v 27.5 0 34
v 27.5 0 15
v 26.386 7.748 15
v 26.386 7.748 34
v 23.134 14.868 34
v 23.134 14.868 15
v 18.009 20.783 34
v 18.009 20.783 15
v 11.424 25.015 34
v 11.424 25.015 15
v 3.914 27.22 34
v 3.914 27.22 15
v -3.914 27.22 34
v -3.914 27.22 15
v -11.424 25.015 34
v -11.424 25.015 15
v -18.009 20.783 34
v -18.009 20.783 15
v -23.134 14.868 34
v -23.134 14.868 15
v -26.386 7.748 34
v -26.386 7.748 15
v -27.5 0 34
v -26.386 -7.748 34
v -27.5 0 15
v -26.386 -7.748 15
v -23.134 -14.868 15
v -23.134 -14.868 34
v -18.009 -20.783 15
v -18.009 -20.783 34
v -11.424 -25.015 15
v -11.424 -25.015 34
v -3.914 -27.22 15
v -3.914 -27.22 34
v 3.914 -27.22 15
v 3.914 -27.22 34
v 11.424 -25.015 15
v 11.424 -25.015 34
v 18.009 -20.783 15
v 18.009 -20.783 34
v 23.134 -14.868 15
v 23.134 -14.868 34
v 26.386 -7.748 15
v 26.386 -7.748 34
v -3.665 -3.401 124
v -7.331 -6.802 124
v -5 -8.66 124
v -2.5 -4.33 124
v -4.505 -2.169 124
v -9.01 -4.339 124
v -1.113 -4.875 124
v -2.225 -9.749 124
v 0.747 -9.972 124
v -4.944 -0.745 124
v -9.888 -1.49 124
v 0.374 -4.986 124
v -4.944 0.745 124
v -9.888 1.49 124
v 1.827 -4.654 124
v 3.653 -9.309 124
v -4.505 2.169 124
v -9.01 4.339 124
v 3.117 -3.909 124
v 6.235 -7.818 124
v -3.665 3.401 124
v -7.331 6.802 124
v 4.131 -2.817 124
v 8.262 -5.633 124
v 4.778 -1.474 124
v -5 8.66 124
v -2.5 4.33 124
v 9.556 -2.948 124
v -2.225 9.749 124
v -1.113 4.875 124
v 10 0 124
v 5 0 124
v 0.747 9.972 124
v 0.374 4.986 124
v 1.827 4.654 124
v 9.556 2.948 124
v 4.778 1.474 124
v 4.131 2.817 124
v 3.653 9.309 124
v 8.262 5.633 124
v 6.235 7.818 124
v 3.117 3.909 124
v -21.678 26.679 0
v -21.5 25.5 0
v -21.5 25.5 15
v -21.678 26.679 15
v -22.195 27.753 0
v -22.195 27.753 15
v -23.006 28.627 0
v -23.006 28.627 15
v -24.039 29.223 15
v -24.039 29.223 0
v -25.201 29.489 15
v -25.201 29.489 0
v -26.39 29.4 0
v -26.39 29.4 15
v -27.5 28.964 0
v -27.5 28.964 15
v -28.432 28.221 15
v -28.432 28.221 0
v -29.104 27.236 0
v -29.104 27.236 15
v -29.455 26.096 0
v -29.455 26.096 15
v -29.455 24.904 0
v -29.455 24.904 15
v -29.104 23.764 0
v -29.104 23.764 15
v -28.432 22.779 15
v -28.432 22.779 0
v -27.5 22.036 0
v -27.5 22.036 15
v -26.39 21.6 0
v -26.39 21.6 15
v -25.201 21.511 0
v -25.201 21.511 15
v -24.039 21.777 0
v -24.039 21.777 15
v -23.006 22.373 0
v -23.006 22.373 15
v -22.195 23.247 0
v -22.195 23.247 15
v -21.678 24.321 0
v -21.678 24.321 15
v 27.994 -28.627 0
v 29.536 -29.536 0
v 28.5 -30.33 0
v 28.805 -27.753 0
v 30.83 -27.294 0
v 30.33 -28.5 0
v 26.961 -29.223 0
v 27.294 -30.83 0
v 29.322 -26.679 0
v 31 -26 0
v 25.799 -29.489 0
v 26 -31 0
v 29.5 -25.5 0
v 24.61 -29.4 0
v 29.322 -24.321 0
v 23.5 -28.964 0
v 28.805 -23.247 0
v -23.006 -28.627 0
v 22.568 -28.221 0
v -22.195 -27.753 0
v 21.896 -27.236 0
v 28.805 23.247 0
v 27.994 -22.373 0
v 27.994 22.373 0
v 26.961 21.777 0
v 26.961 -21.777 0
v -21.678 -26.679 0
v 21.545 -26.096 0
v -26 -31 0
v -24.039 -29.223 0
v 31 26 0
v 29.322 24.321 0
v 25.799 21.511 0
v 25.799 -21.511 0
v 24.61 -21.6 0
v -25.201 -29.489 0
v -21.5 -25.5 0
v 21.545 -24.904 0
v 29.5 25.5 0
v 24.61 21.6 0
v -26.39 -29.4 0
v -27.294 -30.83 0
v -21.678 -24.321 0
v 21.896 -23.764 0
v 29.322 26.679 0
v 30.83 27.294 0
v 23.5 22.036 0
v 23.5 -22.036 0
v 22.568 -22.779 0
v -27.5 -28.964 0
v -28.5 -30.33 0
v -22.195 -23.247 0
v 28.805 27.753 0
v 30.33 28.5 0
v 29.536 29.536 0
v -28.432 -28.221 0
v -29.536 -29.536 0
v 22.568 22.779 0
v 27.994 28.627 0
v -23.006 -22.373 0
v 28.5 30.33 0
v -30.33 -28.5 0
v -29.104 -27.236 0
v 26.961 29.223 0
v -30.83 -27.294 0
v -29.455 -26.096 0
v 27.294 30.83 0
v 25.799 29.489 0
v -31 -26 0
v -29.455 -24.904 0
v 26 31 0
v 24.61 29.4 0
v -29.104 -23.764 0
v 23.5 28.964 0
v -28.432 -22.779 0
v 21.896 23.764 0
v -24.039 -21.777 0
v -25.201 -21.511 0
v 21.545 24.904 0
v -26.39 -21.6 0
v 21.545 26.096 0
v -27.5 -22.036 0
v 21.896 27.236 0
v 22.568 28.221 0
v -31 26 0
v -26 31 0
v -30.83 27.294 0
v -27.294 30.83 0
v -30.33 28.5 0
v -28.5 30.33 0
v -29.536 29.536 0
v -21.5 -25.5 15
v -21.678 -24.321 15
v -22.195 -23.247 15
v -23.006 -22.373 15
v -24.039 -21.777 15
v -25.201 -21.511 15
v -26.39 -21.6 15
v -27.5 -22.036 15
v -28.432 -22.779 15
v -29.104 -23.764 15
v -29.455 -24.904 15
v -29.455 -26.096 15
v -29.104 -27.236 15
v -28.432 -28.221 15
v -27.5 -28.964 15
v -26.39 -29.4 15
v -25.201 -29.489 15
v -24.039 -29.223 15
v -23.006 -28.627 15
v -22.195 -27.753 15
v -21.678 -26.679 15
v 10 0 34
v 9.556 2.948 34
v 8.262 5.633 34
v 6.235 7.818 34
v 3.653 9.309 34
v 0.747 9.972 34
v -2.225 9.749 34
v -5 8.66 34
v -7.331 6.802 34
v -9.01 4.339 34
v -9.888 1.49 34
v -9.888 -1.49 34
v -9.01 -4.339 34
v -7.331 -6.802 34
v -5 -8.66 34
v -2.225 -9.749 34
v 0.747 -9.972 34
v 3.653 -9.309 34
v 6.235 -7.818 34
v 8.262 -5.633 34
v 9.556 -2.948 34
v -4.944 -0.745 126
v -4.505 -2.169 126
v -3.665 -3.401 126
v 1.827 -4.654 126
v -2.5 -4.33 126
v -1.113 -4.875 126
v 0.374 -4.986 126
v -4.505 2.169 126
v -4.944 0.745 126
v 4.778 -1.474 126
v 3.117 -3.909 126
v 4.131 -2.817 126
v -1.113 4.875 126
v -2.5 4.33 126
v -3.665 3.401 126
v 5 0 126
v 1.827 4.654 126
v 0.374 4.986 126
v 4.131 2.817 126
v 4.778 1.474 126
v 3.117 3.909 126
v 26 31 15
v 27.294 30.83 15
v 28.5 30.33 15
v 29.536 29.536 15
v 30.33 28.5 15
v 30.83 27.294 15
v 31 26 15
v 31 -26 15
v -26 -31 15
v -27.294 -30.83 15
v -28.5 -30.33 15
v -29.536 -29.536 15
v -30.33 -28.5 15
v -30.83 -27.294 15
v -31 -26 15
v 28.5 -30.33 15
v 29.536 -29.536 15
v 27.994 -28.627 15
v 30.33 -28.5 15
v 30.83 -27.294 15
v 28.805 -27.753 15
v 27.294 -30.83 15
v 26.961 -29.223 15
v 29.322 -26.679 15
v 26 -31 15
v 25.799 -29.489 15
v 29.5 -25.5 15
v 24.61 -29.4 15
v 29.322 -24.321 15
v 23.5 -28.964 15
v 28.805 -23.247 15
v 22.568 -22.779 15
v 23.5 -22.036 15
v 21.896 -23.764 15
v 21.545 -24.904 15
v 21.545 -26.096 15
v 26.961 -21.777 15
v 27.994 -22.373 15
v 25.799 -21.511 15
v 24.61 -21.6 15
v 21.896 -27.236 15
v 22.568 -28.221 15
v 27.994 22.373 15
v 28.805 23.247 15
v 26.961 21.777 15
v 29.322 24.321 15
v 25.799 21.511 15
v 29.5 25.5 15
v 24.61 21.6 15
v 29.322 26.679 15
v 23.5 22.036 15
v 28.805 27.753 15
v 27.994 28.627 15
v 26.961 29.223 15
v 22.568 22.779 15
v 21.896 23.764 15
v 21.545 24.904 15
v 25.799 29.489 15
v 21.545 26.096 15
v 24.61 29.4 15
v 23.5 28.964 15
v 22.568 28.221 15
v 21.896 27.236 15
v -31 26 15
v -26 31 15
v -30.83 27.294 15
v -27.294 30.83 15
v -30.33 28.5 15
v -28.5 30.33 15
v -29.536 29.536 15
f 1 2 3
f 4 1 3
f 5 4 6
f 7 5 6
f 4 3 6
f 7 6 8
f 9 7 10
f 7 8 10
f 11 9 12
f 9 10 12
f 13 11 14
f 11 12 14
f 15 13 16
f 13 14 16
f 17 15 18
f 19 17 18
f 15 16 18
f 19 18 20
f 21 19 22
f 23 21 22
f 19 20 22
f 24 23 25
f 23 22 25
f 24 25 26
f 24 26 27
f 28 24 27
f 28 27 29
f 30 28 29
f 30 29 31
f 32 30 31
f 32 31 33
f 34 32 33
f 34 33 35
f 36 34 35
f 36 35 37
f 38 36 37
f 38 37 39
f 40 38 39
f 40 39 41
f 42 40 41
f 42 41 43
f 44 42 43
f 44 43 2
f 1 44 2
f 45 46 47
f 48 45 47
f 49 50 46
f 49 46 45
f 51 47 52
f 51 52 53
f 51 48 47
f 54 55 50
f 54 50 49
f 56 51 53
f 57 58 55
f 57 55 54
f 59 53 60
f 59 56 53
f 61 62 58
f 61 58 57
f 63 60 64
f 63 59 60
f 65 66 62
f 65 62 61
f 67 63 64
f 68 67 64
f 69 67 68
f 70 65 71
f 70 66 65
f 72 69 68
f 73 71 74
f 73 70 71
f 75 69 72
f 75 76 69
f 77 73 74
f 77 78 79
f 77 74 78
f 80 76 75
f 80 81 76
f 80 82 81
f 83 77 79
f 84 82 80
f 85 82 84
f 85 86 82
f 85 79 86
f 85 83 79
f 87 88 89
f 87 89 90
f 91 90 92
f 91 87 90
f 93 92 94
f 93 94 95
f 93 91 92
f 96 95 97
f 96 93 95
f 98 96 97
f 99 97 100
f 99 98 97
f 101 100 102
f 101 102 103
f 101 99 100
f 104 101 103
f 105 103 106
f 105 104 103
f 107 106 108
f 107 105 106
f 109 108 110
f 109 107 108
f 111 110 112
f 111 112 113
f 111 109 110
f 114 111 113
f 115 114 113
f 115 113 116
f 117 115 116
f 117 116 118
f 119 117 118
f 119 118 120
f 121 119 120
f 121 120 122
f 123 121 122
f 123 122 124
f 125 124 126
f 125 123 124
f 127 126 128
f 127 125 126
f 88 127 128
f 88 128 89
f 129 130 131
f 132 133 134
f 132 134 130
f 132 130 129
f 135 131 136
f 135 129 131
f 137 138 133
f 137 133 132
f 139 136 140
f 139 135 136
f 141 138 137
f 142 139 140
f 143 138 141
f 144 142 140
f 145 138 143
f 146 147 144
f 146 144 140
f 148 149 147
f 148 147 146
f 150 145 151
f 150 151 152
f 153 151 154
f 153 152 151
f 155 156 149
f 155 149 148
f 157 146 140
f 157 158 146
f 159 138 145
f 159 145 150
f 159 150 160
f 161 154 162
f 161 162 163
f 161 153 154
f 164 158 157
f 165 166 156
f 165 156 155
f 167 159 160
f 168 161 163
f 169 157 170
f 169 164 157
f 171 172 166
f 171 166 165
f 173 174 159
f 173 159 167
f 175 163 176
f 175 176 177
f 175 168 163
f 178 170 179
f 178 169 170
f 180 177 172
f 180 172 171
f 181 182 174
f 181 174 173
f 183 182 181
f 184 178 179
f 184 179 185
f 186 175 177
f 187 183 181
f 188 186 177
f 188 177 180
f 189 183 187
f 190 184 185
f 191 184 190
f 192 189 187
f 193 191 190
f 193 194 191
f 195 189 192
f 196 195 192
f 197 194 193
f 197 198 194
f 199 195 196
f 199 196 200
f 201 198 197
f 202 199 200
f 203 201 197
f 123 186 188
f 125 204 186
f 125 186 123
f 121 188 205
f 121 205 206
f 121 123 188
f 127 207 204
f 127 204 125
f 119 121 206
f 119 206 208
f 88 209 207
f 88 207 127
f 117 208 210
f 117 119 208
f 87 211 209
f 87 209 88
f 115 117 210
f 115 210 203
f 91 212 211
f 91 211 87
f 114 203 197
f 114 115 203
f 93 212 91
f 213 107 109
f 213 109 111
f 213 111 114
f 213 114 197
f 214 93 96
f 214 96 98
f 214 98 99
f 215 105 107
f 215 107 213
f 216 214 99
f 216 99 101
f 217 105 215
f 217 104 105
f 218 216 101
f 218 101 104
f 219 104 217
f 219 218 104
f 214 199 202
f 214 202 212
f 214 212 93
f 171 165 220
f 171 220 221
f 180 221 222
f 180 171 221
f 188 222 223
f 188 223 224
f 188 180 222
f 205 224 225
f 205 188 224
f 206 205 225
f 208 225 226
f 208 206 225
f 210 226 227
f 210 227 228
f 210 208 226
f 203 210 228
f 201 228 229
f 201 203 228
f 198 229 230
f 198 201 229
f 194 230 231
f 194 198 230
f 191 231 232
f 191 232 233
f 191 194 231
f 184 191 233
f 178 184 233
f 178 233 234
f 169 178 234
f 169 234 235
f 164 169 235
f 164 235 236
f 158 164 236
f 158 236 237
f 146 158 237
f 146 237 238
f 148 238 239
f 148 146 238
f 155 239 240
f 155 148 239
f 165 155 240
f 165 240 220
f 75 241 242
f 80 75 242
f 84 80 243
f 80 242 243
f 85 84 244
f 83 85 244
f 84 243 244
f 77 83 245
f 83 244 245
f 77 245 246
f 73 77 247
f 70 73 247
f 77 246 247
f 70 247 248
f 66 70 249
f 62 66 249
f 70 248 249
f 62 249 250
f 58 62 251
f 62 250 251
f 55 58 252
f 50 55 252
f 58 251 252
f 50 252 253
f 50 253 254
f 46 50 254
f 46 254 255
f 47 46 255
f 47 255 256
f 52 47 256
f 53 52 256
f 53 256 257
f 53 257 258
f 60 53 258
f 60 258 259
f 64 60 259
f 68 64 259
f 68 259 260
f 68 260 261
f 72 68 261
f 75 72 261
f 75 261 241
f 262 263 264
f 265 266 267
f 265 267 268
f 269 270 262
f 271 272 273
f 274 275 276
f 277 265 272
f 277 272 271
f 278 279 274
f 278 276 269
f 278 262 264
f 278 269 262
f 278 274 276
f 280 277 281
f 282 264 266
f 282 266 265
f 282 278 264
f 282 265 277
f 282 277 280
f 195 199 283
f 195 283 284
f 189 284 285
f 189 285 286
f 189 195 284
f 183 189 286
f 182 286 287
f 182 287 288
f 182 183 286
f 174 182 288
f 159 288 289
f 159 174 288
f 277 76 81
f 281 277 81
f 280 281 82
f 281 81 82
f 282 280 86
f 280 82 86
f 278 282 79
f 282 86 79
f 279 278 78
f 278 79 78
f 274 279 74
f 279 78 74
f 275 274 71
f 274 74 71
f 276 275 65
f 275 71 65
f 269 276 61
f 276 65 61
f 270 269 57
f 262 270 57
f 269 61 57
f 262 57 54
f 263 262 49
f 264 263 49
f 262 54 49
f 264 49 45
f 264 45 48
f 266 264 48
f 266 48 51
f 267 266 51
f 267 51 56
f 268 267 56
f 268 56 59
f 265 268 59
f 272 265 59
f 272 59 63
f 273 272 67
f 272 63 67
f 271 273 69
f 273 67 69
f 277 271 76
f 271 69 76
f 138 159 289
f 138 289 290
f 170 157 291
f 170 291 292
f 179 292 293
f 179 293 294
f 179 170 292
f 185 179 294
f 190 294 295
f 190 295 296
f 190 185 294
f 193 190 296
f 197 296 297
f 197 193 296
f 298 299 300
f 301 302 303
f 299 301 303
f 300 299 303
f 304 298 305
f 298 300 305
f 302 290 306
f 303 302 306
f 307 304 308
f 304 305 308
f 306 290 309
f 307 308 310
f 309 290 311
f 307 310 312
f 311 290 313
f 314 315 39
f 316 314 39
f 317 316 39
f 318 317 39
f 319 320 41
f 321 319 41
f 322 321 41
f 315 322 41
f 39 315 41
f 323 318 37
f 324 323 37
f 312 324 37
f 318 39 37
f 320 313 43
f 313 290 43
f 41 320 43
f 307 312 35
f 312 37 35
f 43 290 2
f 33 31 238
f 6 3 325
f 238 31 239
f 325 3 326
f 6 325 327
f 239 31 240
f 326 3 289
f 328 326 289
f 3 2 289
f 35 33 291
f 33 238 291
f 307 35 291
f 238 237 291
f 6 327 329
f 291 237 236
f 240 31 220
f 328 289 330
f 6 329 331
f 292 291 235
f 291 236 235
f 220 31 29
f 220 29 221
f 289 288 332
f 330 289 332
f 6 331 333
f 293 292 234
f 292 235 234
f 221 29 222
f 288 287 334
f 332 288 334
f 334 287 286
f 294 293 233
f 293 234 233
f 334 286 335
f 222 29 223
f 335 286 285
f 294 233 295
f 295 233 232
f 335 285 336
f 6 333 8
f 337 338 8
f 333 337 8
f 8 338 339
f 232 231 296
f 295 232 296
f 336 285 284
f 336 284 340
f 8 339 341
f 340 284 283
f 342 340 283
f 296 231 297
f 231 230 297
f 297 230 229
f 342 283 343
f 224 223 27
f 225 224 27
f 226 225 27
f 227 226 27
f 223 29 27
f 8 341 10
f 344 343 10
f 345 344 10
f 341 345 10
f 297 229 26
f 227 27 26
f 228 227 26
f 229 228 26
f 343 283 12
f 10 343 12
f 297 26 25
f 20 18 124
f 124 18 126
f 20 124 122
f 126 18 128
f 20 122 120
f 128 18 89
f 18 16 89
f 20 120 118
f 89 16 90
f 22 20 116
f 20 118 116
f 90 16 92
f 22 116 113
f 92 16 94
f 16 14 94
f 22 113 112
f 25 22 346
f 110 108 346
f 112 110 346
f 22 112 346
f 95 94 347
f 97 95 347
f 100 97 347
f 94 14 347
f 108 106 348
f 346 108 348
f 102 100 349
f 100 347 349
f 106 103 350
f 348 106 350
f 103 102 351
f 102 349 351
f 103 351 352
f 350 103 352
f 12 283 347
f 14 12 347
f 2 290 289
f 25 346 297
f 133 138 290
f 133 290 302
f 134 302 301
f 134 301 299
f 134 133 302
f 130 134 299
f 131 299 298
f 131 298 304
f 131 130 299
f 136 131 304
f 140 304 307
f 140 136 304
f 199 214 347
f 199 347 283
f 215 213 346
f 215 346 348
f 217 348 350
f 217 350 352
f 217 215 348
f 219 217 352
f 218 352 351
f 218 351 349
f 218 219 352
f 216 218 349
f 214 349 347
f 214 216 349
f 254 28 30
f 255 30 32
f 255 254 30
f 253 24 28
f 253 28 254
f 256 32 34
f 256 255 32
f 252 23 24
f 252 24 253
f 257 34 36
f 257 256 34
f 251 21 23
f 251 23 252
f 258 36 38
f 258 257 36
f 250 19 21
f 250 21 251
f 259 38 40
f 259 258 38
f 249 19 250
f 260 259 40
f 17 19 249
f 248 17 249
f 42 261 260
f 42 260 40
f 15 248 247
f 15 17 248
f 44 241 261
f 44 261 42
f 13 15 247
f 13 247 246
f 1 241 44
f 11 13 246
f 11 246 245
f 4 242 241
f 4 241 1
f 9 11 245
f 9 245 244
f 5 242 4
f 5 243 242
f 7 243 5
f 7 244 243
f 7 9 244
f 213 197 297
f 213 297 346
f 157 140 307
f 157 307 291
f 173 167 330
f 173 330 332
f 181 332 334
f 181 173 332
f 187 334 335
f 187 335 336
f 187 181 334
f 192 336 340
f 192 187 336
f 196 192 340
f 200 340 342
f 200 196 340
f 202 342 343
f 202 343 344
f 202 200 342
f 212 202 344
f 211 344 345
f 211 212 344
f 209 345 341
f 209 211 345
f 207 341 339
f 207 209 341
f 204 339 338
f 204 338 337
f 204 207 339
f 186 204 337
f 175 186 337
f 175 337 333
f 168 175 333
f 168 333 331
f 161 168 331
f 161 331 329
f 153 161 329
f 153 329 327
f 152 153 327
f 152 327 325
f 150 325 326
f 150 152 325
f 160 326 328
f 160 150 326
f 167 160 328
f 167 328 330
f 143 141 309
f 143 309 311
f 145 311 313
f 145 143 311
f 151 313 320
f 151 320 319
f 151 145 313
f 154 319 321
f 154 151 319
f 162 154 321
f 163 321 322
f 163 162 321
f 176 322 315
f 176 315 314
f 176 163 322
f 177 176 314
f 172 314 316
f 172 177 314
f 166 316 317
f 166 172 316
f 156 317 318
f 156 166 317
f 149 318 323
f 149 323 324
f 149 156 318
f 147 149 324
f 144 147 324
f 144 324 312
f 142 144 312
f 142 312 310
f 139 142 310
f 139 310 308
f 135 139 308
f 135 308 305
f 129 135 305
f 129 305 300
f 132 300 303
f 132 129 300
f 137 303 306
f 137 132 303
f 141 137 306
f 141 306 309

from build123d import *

# Parameters (mm, degrees)
SKETCH1_R           = 27.5
SKETCH1_R_2         = 4
BOSS_EXTRUDE1_DEPTH = 15
SKETCH1_3_R         = 27.5
SKETCH1_3_R_2       = 10
BOSS_EXTRUDE2_DEPTH = 34
SKETCH1_4_R         = 10
BOSS_EXTRUDE3_DEPTH = 124
BOSS_EXTRUDE4_START = 124
SKETCH1_5_R         = 5
BOSS_EXTRUDE4_DEPTH = 2


with BuildPart() as part:
    # Sketch1 → Boss-Extrude1 (new body)
    with BuildSketch(Plane.XY):
        with BuildLine():
            Line((-26, 31), (26, 31))
            ThreePointArc((26, 31), (29.535533906, 29.535533906), (31, 26))
            Line((31, 26), (31, -26))
            ThreePointArc((31, -26), (29.535533906, -29.535533906), (26, -31))
            Line((26, -31), (-26, -31))
            ThreePointArc((-26, -31), (-29.535533906, -29.535533906), (-31, -26))
            Line((-31, -26), (-31, 26))
            ThreePointArc((-31, 26), (-29.535533906, 29.535533906), (-26, 31))
        make_face()
        Circle(SKETCH1_R, mode=Mode.SUBTRACT)
        with Locations((-25.5, 25.5)):
            Circle(SKETCH1_R_2, mode=Mode.SUBTRACT)
        with Locations((25.5, 25.5)):
            Circle(SKETCH1_R_2, mode=Mode.SUBTRACT)
        with Locations((-25.5, -25.5)):
            Circle(SKETCH1_R_2, mode=Mode.SUBTRACT)
        with Locations((25.5, -25.5)):
            Circle(SKETCH1_R_2, mode=Mode.SUBTRACT)
    extrude(amount=BOSS_EXTRUDE1_DEPTH)

    # Sketch1<3> → Boss-Extrude2 (add)
    with BuildSketch(Plane.XY):
        Circle(SKETCH1_3_R)
        Circle(SKETCH1_3_R_2, mode=Mode.SUBTRACT)
    extrude(amount=BOSS_EXTRUDE2_DEPTH)

    # Sketch1<4> → Boss-Extrude3 (add)
    with BuildSketch(Plane.XY):
        Circle(SKETCH1_4_R)
    extrude(amount=BOSS_EXTRUDE3_DEPTH)

    # Sketch1<5> → Boss-Extrude4 (add)
    with BuildSketch(Plane.XY.offset(BOSS_EXTRUDE4_START)):
        Circle(SKETCH1_5_R)
    extrude(amount=BOSS_EXTRUDE4_DEPTH)


solid = part.part
